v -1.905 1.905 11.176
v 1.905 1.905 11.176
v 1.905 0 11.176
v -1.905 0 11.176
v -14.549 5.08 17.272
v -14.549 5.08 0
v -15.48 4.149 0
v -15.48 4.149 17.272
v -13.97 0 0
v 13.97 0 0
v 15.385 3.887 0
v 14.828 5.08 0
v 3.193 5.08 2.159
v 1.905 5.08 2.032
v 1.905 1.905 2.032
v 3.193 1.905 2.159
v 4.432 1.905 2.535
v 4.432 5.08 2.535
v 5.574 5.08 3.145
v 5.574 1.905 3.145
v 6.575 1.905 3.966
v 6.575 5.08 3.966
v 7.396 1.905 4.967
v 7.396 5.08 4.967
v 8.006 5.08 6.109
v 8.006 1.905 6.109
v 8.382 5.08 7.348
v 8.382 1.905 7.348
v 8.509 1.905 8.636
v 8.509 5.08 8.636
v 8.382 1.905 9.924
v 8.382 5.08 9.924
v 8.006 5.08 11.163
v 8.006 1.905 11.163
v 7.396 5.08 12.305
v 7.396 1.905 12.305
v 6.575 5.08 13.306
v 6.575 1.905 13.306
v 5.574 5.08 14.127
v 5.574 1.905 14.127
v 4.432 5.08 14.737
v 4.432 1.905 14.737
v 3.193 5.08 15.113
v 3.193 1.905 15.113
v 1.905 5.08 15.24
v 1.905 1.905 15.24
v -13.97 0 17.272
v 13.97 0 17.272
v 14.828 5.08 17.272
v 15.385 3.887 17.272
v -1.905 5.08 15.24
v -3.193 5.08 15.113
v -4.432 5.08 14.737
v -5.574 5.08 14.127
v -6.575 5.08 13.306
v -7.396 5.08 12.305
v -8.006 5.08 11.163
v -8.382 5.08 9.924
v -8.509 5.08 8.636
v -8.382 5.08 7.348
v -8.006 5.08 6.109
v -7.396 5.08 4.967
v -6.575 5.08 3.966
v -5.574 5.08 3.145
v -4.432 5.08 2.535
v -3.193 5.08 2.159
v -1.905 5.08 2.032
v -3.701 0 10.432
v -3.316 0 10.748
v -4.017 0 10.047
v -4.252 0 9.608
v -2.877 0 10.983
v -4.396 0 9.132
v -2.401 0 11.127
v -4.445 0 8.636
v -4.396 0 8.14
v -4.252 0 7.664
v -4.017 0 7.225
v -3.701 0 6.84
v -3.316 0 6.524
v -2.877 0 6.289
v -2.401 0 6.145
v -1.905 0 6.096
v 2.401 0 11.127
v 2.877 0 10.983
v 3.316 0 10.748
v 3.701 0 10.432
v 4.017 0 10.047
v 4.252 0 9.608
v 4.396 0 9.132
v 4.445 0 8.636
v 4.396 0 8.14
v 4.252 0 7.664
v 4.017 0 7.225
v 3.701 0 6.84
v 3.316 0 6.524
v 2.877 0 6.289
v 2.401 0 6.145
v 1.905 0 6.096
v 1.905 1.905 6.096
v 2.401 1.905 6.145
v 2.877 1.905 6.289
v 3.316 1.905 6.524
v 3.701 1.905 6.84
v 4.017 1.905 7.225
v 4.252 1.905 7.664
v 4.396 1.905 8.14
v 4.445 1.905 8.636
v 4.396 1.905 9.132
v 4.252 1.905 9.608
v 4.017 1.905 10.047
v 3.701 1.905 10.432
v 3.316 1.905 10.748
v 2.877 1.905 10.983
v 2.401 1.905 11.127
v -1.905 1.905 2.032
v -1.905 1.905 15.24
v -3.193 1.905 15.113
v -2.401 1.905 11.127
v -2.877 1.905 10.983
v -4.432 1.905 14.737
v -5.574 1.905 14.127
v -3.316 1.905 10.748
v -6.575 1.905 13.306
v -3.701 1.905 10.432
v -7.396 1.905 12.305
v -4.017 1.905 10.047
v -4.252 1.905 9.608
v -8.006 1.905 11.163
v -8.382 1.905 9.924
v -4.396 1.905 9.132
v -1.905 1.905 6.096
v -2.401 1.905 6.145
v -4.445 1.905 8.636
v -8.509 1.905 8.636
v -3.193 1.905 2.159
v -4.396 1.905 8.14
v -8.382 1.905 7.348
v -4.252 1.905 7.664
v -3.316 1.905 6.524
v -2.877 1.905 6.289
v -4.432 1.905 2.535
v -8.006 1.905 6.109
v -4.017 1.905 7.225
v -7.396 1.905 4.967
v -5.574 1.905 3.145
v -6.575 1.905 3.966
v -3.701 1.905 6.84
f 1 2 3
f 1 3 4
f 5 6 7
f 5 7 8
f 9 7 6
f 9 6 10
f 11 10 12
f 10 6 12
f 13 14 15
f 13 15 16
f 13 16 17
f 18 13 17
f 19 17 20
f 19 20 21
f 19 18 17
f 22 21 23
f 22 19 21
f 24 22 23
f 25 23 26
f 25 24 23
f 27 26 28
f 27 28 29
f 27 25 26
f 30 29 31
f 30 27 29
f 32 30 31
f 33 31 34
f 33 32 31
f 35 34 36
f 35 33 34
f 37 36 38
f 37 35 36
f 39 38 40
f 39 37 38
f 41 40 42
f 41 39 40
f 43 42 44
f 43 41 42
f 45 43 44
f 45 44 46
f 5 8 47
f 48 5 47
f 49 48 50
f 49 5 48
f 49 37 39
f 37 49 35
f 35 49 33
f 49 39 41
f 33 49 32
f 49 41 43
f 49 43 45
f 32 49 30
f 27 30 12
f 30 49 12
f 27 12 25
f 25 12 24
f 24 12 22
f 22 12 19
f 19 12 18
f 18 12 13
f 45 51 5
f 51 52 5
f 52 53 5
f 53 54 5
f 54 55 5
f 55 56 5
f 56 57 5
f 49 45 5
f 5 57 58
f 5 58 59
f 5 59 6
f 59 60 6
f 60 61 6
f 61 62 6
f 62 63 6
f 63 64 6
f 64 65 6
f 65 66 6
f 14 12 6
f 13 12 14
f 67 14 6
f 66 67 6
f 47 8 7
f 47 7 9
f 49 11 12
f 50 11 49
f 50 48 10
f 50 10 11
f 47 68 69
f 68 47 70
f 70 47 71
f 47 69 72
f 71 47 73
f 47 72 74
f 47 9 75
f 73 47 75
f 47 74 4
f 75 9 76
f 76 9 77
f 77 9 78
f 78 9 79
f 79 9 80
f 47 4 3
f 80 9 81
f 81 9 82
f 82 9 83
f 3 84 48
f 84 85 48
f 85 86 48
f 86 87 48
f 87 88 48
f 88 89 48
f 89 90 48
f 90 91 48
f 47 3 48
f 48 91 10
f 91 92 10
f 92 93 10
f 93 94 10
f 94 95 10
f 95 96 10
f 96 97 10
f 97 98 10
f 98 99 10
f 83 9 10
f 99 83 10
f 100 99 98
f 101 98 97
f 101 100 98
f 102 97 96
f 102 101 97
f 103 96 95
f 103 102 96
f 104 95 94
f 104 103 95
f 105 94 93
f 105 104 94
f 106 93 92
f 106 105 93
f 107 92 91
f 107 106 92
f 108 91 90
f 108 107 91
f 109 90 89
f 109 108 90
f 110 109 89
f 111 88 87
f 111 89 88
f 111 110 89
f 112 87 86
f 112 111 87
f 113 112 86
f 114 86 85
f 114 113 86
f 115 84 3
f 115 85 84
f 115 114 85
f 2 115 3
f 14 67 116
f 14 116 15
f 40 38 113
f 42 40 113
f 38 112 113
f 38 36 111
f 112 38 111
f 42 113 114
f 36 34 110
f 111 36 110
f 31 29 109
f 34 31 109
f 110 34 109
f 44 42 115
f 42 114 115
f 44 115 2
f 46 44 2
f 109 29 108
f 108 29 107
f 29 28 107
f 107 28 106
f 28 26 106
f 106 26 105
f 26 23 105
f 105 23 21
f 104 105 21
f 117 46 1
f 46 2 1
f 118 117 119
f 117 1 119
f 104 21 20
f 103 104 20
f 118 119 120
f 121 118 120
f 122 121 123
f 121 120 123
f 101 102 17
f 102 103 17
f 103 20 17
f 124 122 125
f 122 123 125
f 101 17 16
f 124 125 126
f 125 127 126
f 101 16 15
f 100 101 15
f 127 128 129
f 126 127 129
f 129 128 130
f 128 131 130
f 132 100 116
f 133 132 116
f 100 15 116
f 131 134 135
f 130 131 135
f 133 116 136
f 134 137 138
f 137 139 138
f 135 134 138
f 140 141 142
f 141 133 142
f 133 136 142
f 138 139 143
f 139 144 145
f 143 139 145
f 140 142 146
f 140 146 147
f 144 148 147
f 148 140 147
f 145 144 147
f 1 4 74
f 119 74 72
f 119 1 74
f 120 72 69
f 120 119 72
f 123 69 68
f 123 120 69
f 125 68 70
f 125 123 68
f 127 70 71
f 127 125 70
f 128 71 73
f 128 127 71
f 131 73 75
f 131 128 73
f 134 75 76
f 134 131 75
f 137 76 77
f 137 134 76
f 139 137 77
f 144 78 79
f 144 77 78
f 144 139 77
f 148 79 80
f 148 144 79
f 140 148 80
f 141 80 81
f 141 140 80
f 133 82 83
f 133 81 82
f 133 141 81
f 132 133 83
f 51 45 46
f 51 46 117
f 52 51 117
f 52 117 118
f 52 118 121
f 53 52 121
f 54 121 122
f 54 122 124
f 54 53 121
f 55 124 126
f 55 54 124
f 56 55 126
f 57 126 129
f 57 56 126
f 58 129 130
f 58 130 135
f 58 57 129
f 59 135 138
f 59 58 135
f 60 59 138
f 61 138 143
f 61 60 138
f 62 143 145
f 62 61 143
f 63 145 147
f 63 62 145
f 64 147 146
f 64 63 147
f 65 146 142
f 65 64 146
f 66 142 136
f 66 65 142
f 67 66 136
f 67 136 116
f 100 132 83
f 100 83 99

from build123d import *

# Parameters (mm, degrees)
BOSS_EXTRUDE1_DEPTH   = 17.272
SKETCH2_OUTSIDE_W     = 40.918
SKETCH2_OUTSIDE_H     = 26.552
SKETCH2_OUTSIDE_W_2   = 31.63793758
SKETCH2_OUTSIDE_H_2   = 17.272
CUT_EXTRUDE1_DEPTH    = 3.175
CUT_EXTRUDE3_DEPTH    = 2.905
CHAMFER1_SIZE2        = 1.27
CHAMFER1_SIZE         = 0.990861631
CHAMFER1_EDGE_2_SIZE2 = 1.27
CHAMFER1_EDGE_2_SIZE  = 0.990861631


with BuildPart() as part:
    # Sketch1 → Boss-Extrude1 (new body)
    with BuildSketch(Plane.XY):
        Polygon((-13.97, 0), (13.97, 0), (15.81896879, 5.08), (-15.81896879, 5.08), align=None)
    extrude(amount=BOSS_EXTRUDE1_DEPTH)

    # Sketch2 outside → Cut-Extrude1 (cut)
    with BuildSketch(Plane(origin=(0, 5.08, 0), x_dir=(1, 0, 0), z_dir=(0, 1, 0))):
        with Locations((0, -8.636)):
            Rectangle(SKETCH2_OUTSIDE_W, SKETCH2_OUTSIDE_H)
        with Locations((0, -8.636)):
            Rectangle(SKETCH2_OUTSIDE_W_2, SKETCH2_OUTSIDE_H_2, mode=Mode.SUBTRACT)
        with BuildLine():
            Line((1.905, -15.24), (-1.905, -15.24))
            ThreePointArc((-1.905, -15.24), (-8.509, -8.636), (-1.905, -2.032))
            Line((-1.905, -2.032), (1.905, -2.032))
            ThreePointArc((1.905, -2.032), (8.509, -8.636), (1.905, -15.24))
        make_face()
    extrude(amount=-CUT_EXTRUDE1_DEPTH, mode=Mode.SUBTRACT)

    # Sketch4 → Cut-Extrude3 (cut, through all)
    with BuildSketch(Plane(origin=(0, 1.905, 0), x_dir=(1, 0, 0), z_dir=(0, 1, 0))):
        with BuildLine():
            Line((1.905, -11.176), (-1.905, -11.176))
            ThreePointArc((-1.905, -11.176), (-4.445, -8.636), (-1.905, -6.096))
            Line((-1.905, -6.096), (1.905, -6.096))
            ThreePointArc((1.905, -6.096), (4.445, -8.636), (1.905, -11.176))
        make_face()
    extrude(amount=-CUT_EXTRUDE3_DEPTH, mode=Mode.SUBTRACT)

    # Chamfer1
    chamfer1_edges = [part.edges().sort_by_distance(p)[0] for p in [
        (-15.81896879, 5.08, 8.636),
    ]]
    chamfer(chamfer1_edges, length=CHAMFER1_SIZE, length2=CHAMFER1_SIZE2)

    # Chamfer1 edge 2
    chamfer1_edge_2_edges = [part.edges().sort_by_distance(p)[0] for p in [
        (15.81896879, 5.08, 8.636),
    ]]
    chamfer(chamfer1_edge_2_edges, length=CHAMFER1_EDGE_2_SIZE, length2=CHAMFER1_EDGE_2_SIZE2)


solid = part.part
